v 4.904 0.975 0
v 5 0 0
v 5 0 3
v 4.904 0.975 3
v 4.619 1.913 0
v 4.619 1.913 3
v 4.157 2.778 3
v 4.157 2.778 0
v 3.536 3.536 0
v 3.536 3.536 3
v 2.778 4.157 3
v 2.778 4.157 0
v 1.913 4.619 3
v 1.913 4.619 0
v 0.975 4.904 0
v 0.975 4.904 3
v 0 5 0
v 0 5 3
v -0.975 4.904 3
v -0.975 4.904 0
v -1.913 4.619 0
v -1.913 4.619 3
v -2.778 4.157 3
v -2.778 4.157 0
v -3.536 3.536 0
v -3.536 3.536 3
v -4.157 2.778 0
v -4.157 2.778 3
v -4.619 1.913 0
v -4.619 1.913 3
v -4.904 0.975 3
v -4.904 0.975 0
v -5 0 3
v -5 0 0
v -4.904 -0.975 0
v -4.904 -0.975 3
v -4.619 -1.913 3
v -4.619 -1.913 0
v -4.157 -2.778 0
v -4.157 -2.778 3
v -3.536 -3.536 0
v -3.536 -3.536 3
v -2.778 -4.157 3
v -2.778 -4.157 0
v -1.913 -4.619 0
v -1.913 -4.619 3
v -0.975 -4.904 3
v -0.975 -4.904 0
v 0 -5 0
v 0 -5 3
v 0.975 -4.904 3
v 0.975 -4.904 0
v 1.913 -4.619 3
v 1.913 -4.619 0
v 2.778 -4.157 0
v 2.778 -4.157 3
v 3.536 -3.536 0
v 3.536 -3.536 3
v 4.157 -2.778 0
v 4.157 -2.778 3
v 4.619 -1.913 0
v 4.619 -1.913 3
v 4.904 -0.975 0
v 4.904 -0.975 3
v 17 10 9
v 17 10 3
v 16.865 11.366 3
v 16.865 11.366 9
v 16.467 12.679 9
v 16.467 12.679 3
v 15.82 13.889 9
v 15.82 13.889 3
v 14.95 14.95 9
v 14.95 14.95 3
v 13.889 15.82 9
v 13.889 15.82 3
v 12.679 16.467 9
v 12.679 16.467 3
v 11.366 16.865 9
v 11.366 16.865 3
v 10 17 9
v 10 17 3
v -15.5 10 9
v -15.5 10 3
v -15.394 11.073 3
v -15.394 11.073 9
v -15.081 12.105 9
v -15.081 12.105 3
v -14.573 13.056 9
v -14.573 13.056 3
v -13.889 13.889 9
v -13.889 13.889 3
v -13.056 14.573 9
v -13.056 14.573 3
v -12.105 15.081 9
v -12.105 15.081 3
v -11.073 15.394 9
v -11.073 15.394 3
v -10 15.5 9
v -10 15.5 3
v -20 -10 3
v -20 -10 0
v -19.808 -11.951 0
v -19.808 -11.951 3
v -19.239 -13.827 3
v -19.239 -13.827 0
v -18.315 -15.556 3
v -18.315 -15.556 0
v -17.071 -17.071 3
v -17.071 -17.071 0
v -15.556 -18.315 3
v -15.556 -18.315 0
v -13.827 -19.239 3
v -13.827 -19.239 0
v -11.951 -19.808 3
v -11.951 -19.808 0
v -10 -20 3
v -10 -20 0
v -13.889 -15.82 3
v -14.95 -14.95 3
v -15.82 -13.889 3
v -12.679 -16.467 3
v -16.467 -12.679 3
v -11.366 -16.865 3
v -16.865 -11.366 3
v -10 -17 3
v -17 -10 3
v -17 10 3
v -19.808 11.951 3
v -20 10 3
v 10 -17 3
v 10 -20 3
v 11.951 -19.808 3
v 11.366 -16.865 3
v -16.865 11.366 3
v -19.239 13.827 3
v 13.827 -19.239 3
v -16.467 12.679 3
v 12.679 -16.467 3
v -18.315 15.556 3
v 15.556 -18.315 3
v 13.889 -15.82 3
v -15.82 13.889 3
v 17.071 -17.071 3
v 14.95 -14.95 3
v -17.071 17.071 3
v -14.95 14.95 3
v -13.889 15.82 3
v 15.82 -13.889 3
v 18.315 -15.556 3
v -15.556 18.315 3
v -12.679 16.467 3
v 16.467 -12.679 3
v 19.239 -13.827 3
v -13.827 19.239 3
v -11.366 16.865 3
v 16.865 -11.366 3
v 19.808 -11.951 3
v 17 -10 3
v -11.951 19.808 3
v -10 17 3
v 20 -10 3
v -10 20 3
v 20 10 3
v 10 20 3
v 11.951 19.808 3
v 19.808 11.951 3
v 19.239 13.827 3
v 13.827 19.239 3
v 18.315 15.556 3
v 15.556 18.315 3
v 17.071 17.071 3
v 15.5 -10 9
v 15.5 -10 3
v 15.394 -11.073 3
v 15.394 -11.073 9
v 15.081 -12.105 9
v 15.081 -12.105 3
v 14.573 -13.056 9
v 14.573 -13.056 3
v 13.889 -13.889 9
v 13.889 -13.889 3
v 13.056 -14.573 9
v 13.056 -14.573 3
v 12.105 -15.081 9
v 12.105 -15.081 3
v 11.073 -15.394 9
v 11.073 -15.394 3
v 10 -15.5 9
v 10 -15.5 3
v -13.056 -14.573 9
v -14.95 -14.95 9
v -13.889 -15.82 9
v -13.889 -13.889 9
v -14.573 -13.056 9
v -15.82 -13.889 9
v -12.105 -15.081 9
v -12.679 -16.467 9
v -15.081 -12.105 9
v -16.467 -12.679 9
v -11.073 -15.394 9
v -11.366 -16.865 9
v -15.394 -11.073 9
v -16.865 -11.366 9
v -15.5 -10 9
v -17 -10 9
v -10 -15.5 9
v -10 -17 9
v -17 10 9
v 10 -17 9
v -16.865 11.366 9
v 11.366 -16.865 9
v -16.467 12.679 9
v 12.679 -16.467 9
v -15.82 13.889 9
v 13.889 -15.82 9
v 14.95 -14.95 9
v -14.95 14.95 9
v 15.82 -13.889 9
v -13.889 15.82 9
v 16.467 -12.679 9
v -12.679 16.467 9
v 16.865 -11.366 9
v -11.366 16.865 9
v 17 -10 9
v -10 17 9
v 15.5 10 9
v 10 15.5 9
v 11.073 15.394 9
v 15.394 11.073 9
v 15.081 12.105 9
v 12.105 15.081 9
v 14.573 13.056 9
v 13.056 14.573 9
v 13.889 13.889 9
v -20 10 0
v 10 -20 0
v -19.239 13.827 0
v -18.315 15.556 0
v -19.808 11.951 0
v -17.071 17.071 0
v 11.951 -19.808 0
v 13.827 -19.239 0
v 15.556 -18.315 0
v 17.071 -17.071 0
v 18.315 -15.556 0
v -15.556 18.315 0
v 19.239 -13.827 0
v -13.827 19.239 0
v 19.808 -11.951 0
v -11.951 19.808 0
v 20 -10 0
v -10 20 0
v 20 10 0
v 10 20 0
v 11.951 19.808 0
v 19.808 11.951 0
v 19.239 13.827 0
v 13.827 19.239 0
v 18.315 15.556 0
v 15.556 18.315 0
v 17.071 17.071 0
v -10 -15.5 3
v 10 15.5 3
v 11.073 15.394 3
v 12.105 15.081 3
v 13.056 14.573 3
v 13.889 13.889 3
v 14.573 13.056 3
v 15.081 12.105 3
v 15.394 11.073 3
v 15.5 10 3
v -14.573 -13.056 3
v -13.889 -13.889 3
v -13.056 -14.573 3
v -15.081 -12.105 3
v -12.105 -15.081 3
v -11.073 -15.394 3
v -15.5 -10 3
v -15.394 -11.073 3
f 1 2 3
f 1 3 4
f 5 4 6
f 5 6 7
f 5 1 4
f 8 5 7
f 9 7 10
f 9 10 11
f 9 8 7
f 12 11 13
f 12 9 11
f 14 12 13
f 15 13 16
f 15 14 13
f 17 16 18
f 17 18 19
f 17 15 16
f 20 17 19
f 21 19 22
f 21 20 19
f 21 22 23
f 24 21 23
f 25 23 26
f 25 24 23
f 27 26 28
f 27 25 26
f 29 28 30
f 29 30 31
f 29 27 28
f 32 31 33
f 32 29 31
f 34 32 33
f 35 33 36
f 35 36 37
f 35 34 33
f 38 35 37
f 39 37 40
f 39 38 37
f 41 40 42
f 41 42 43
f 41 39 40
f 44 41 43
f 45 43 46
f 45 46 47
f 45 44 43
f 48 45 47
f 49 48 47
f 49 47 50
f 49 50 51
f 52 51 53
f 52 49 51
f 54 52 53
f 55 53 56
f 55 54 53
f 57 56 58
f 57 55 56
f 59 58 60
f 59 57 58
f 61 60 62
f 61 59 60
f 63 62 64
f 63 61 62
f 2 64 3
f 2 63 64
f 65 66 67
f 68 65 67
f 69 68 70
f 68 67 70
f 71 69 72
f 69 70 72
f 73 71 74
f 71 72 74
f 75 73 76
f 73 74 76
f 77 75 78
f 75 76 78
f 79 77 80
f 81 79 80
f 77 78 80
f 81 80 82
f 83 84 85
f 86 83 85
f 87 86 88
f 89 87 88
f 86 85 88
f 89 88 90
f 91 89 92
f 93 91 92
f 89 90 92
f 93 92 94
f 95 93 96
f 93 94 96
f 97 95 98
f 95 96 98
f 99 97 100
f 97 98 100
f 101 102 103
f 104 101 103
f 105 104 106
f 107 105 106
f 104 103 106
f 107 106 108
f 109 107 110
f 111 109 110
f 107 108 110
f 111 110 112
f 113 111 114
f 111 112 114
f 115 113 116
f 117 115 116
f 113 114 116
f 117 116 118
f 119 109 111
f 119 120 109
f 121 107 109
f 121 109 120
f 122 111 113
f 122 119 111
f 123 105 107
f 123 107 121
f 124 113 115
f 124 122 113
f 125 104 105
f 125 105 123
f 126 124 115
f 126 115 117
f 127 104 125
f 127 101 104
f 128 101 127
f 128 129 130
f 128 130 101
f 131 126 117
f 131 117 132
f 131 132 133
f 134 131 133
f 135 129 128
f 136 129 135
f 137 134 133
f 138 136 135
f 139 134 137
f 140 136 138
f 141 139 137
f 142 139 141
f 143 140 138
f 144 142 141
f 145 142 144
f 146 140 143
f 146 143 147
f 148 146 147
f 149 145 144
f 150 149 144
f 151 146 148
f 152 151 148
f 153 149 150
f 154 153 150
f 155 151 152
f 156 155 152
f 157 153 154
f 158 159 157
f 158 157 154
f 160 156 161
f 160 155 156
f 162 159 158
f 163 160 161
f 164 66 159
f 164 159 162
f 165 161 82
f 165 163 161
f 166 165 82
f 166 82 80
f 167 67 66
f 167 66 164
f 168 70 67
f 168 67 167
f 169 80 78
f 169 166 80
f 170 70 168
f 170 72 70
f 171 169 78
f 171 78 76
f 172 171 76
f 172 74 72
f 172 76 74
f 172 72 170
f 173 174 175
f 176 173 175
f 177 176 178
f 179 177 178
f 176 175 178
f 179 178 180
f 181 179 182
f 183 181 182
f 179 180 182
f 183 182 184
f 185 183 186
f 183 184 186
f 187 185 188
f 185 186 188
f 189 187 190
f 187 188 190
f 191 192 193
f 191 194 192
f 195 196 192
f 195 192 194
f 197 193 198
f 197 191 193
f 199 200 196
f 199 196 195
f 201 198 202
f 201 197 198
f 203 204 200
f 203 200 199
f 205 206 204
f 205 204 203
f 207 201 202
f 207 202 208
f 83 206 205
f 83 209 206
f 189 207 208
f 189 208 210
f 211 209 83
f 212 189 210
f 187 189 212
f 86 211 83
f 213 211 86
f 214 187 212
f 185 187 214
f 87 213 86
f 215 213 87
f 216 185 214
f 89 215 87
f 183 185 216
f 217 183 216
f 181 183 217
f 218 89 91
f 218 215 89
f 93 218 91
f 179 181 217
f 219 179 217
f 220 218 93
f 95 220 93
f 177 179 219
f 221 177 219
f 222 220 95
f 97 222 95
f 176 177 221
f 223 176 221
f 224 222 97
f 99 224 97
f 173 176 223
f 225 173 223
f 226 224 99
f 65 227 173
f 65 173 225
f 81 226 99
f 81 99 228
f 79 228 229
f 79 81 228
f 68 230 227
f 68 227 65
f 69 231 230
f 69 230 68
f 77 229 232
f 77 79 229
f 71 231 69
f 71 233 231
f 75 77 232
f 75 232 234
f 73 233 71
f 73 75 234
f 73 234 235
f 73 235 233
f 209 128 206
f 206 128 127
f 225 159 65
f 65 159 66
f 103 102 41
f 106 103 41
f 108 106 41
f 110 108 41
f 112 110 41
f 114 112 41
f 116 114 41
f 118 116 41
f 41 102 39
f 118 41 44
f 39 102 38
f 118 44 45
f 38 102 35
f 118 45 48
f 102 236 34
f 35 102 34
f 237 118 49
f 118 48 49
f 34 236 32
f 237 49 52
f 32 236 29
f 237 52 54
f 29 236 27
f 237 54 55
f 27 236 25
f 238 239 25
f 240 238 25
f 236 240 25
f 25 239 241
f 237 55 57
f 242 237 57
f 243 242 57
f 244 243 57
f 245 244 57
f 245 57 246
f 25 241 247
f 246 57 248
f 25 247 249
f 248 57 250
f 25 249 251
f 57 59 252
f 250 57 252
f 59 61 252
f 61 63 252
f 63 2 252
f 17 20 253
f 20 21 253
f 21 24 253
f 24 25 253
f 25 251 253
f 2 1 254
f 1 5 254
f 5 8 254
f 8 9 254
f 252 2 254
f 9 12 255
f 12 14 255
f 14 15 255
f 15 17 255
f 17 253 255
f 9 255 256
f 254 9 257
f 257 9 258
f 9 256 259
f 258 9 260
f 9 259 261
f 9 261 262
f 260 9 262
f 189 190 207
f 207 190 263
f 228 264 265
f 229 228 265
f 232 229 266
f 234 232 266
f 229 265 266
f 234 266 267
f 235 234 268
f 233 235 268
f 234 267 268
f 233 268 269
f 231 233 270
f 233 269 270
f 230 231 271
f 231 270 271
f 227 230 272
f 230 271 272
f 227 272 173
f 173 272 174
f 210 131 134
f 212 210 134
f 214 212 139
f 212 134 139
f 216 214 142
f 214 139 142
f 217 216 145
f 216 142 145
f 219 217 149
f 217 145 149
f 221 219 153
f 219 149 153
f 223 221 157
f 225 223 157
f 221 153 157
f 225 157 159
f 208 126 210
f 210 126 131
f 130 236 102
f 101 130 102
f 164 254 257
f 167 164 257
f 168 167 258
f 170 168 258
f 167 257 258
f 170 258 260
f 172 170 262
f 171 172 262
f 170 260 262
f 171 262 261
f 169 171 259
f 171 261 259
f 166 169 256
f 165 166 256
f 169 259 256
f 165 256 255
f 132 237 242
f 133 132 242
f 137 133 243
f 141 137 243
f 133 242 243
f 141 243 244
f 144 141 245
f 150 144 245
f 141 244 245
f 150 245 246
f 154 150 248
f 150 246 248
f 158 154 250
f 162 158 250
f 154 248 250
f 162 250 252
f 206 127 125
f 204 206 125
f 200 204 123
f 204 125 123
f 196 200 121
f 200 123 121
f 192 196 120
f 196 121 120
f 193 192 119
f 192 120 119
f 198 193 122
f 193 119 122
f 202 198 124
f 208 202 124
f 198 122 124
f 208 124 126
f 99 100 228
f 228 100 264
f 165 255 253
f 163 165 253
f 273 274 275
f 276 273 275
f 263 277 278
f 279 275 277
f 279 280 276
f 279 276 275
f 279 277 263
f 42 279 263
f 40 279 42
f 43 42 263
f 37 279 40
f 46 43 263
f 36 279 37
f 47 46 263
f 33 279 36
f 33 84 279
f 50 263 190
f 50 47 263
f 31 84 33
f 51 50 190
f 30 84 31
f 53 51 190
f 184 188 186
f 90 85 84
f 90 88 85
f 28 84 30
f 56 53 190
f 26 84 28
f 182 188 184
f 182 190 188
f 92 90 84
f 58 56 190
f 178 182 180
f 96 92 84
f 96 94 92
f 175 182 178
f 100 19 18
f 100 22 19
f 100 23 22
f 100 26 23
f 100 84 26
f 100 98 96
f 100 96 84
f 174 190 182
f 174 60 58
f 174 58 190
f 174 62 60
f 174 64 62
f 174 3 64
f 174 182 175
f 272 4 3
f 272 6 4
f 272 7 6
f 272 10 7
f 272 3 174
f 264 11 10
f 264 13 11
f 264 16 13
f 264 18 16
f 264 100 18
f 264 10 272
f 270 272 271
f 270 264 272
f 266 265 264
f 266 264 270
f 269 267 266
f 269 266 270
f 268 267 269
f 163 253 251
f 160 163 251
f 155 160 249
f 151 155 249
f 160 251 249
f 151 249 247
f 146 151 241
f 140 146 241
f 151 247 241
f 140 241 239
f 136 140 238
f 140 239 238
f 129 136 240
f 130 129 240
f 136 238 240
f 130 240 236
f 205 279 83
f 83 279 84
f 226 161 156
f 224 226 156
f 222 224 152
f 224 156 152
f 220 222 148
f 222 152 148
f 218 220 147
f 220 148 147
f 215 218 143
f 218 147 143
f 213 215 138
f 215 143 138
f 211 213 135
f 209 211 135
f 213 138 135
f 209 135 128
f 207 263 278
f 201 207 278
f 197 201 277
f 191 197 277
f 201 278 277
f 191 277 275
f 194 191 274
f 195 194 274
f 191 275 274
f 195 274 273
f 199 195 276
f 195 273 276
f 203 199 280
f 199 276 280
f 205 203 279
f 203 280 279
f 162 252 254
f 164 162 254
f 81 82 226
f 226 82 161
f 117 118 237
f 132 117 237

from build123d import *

# Parameters (mm, degrees)
F0_R     = 5
F1_DEPTH = 3
F3_DEPTH = 6


with BuildPart() as f1:
    # F0 (on Top) → F1 (new body)
    with BuildSketch(Plane.XY):
        with BuildLine():
            ThreePointArc((20, 10), (17.071068, 17.071068), (10, 20))
            Line((10, 20), (-10, 20))
            ThreePointArc((-10, 20), (-17.071068, 17.071068), (-20, 10))
            Line((-20, 10), (-20, -10))
            ThreePointArc((-20, -10), (-17.071068, -17.071068), (-10, -20))
            Line((-10, -20), (10, -20))
            ThreePointArc((10, -20), (17.071068, -17.071068), (20, -10))
            Line((20, -10), (20, 10))
        make_face()
        Circle(F0_R, mode=Mode.SUBTRACT)
    extrude(amount=F1_DEPTH)

    # F2 (on face) → F3 (join)
    with BuildSketch(Plane.XY.offset(3)):
        with BuildLine():
            ThreePointArc((17, 10), (14.949747, 14.949747), (10, 17))
            Line((10, 17), (-10, 17))
            ThreePointArc((-10, 17), (-14.949747, 14.949747), (-17, 10))
            Line((-17, 10), (-17, -10))
            ThreePointArc((-17, -10), (-14.949747, -14.949747), (-10, -17))
            Line((-10, -17), (10, -17))
            ThreePointArc((10, -17), (14.949747, -14.949747), (17, -10))
            Line((17, -10), (17, 10))
        make_face()
        with BuildLine():
            Line((-10, 15.5), (10, 15.5))
            ThreePointArc((10, 15.5), (13.889087, 13.889087), (15.5, 10))
            Line((15.5, 10), (15.5, -10))
            ThreePointArc((15.5, -10), (13.889087, -13.889087), (10, -15.5))
            Line((10, -15.5), (-10, -15.5))
            ThreePointArc((-10, -15.5), (-13.889087, -13.889087), (-15.5, -10))
            Line((-15.5, -10), (-15.5, 10))
            ThreePointArc((-15.5, 10), (-13.889087, 13.889087), (-10, 15.5))
        make_face(mode=Mode.SUBTRACT)
    extrude(amount=F3_DEPTH)


solid = f1.part
